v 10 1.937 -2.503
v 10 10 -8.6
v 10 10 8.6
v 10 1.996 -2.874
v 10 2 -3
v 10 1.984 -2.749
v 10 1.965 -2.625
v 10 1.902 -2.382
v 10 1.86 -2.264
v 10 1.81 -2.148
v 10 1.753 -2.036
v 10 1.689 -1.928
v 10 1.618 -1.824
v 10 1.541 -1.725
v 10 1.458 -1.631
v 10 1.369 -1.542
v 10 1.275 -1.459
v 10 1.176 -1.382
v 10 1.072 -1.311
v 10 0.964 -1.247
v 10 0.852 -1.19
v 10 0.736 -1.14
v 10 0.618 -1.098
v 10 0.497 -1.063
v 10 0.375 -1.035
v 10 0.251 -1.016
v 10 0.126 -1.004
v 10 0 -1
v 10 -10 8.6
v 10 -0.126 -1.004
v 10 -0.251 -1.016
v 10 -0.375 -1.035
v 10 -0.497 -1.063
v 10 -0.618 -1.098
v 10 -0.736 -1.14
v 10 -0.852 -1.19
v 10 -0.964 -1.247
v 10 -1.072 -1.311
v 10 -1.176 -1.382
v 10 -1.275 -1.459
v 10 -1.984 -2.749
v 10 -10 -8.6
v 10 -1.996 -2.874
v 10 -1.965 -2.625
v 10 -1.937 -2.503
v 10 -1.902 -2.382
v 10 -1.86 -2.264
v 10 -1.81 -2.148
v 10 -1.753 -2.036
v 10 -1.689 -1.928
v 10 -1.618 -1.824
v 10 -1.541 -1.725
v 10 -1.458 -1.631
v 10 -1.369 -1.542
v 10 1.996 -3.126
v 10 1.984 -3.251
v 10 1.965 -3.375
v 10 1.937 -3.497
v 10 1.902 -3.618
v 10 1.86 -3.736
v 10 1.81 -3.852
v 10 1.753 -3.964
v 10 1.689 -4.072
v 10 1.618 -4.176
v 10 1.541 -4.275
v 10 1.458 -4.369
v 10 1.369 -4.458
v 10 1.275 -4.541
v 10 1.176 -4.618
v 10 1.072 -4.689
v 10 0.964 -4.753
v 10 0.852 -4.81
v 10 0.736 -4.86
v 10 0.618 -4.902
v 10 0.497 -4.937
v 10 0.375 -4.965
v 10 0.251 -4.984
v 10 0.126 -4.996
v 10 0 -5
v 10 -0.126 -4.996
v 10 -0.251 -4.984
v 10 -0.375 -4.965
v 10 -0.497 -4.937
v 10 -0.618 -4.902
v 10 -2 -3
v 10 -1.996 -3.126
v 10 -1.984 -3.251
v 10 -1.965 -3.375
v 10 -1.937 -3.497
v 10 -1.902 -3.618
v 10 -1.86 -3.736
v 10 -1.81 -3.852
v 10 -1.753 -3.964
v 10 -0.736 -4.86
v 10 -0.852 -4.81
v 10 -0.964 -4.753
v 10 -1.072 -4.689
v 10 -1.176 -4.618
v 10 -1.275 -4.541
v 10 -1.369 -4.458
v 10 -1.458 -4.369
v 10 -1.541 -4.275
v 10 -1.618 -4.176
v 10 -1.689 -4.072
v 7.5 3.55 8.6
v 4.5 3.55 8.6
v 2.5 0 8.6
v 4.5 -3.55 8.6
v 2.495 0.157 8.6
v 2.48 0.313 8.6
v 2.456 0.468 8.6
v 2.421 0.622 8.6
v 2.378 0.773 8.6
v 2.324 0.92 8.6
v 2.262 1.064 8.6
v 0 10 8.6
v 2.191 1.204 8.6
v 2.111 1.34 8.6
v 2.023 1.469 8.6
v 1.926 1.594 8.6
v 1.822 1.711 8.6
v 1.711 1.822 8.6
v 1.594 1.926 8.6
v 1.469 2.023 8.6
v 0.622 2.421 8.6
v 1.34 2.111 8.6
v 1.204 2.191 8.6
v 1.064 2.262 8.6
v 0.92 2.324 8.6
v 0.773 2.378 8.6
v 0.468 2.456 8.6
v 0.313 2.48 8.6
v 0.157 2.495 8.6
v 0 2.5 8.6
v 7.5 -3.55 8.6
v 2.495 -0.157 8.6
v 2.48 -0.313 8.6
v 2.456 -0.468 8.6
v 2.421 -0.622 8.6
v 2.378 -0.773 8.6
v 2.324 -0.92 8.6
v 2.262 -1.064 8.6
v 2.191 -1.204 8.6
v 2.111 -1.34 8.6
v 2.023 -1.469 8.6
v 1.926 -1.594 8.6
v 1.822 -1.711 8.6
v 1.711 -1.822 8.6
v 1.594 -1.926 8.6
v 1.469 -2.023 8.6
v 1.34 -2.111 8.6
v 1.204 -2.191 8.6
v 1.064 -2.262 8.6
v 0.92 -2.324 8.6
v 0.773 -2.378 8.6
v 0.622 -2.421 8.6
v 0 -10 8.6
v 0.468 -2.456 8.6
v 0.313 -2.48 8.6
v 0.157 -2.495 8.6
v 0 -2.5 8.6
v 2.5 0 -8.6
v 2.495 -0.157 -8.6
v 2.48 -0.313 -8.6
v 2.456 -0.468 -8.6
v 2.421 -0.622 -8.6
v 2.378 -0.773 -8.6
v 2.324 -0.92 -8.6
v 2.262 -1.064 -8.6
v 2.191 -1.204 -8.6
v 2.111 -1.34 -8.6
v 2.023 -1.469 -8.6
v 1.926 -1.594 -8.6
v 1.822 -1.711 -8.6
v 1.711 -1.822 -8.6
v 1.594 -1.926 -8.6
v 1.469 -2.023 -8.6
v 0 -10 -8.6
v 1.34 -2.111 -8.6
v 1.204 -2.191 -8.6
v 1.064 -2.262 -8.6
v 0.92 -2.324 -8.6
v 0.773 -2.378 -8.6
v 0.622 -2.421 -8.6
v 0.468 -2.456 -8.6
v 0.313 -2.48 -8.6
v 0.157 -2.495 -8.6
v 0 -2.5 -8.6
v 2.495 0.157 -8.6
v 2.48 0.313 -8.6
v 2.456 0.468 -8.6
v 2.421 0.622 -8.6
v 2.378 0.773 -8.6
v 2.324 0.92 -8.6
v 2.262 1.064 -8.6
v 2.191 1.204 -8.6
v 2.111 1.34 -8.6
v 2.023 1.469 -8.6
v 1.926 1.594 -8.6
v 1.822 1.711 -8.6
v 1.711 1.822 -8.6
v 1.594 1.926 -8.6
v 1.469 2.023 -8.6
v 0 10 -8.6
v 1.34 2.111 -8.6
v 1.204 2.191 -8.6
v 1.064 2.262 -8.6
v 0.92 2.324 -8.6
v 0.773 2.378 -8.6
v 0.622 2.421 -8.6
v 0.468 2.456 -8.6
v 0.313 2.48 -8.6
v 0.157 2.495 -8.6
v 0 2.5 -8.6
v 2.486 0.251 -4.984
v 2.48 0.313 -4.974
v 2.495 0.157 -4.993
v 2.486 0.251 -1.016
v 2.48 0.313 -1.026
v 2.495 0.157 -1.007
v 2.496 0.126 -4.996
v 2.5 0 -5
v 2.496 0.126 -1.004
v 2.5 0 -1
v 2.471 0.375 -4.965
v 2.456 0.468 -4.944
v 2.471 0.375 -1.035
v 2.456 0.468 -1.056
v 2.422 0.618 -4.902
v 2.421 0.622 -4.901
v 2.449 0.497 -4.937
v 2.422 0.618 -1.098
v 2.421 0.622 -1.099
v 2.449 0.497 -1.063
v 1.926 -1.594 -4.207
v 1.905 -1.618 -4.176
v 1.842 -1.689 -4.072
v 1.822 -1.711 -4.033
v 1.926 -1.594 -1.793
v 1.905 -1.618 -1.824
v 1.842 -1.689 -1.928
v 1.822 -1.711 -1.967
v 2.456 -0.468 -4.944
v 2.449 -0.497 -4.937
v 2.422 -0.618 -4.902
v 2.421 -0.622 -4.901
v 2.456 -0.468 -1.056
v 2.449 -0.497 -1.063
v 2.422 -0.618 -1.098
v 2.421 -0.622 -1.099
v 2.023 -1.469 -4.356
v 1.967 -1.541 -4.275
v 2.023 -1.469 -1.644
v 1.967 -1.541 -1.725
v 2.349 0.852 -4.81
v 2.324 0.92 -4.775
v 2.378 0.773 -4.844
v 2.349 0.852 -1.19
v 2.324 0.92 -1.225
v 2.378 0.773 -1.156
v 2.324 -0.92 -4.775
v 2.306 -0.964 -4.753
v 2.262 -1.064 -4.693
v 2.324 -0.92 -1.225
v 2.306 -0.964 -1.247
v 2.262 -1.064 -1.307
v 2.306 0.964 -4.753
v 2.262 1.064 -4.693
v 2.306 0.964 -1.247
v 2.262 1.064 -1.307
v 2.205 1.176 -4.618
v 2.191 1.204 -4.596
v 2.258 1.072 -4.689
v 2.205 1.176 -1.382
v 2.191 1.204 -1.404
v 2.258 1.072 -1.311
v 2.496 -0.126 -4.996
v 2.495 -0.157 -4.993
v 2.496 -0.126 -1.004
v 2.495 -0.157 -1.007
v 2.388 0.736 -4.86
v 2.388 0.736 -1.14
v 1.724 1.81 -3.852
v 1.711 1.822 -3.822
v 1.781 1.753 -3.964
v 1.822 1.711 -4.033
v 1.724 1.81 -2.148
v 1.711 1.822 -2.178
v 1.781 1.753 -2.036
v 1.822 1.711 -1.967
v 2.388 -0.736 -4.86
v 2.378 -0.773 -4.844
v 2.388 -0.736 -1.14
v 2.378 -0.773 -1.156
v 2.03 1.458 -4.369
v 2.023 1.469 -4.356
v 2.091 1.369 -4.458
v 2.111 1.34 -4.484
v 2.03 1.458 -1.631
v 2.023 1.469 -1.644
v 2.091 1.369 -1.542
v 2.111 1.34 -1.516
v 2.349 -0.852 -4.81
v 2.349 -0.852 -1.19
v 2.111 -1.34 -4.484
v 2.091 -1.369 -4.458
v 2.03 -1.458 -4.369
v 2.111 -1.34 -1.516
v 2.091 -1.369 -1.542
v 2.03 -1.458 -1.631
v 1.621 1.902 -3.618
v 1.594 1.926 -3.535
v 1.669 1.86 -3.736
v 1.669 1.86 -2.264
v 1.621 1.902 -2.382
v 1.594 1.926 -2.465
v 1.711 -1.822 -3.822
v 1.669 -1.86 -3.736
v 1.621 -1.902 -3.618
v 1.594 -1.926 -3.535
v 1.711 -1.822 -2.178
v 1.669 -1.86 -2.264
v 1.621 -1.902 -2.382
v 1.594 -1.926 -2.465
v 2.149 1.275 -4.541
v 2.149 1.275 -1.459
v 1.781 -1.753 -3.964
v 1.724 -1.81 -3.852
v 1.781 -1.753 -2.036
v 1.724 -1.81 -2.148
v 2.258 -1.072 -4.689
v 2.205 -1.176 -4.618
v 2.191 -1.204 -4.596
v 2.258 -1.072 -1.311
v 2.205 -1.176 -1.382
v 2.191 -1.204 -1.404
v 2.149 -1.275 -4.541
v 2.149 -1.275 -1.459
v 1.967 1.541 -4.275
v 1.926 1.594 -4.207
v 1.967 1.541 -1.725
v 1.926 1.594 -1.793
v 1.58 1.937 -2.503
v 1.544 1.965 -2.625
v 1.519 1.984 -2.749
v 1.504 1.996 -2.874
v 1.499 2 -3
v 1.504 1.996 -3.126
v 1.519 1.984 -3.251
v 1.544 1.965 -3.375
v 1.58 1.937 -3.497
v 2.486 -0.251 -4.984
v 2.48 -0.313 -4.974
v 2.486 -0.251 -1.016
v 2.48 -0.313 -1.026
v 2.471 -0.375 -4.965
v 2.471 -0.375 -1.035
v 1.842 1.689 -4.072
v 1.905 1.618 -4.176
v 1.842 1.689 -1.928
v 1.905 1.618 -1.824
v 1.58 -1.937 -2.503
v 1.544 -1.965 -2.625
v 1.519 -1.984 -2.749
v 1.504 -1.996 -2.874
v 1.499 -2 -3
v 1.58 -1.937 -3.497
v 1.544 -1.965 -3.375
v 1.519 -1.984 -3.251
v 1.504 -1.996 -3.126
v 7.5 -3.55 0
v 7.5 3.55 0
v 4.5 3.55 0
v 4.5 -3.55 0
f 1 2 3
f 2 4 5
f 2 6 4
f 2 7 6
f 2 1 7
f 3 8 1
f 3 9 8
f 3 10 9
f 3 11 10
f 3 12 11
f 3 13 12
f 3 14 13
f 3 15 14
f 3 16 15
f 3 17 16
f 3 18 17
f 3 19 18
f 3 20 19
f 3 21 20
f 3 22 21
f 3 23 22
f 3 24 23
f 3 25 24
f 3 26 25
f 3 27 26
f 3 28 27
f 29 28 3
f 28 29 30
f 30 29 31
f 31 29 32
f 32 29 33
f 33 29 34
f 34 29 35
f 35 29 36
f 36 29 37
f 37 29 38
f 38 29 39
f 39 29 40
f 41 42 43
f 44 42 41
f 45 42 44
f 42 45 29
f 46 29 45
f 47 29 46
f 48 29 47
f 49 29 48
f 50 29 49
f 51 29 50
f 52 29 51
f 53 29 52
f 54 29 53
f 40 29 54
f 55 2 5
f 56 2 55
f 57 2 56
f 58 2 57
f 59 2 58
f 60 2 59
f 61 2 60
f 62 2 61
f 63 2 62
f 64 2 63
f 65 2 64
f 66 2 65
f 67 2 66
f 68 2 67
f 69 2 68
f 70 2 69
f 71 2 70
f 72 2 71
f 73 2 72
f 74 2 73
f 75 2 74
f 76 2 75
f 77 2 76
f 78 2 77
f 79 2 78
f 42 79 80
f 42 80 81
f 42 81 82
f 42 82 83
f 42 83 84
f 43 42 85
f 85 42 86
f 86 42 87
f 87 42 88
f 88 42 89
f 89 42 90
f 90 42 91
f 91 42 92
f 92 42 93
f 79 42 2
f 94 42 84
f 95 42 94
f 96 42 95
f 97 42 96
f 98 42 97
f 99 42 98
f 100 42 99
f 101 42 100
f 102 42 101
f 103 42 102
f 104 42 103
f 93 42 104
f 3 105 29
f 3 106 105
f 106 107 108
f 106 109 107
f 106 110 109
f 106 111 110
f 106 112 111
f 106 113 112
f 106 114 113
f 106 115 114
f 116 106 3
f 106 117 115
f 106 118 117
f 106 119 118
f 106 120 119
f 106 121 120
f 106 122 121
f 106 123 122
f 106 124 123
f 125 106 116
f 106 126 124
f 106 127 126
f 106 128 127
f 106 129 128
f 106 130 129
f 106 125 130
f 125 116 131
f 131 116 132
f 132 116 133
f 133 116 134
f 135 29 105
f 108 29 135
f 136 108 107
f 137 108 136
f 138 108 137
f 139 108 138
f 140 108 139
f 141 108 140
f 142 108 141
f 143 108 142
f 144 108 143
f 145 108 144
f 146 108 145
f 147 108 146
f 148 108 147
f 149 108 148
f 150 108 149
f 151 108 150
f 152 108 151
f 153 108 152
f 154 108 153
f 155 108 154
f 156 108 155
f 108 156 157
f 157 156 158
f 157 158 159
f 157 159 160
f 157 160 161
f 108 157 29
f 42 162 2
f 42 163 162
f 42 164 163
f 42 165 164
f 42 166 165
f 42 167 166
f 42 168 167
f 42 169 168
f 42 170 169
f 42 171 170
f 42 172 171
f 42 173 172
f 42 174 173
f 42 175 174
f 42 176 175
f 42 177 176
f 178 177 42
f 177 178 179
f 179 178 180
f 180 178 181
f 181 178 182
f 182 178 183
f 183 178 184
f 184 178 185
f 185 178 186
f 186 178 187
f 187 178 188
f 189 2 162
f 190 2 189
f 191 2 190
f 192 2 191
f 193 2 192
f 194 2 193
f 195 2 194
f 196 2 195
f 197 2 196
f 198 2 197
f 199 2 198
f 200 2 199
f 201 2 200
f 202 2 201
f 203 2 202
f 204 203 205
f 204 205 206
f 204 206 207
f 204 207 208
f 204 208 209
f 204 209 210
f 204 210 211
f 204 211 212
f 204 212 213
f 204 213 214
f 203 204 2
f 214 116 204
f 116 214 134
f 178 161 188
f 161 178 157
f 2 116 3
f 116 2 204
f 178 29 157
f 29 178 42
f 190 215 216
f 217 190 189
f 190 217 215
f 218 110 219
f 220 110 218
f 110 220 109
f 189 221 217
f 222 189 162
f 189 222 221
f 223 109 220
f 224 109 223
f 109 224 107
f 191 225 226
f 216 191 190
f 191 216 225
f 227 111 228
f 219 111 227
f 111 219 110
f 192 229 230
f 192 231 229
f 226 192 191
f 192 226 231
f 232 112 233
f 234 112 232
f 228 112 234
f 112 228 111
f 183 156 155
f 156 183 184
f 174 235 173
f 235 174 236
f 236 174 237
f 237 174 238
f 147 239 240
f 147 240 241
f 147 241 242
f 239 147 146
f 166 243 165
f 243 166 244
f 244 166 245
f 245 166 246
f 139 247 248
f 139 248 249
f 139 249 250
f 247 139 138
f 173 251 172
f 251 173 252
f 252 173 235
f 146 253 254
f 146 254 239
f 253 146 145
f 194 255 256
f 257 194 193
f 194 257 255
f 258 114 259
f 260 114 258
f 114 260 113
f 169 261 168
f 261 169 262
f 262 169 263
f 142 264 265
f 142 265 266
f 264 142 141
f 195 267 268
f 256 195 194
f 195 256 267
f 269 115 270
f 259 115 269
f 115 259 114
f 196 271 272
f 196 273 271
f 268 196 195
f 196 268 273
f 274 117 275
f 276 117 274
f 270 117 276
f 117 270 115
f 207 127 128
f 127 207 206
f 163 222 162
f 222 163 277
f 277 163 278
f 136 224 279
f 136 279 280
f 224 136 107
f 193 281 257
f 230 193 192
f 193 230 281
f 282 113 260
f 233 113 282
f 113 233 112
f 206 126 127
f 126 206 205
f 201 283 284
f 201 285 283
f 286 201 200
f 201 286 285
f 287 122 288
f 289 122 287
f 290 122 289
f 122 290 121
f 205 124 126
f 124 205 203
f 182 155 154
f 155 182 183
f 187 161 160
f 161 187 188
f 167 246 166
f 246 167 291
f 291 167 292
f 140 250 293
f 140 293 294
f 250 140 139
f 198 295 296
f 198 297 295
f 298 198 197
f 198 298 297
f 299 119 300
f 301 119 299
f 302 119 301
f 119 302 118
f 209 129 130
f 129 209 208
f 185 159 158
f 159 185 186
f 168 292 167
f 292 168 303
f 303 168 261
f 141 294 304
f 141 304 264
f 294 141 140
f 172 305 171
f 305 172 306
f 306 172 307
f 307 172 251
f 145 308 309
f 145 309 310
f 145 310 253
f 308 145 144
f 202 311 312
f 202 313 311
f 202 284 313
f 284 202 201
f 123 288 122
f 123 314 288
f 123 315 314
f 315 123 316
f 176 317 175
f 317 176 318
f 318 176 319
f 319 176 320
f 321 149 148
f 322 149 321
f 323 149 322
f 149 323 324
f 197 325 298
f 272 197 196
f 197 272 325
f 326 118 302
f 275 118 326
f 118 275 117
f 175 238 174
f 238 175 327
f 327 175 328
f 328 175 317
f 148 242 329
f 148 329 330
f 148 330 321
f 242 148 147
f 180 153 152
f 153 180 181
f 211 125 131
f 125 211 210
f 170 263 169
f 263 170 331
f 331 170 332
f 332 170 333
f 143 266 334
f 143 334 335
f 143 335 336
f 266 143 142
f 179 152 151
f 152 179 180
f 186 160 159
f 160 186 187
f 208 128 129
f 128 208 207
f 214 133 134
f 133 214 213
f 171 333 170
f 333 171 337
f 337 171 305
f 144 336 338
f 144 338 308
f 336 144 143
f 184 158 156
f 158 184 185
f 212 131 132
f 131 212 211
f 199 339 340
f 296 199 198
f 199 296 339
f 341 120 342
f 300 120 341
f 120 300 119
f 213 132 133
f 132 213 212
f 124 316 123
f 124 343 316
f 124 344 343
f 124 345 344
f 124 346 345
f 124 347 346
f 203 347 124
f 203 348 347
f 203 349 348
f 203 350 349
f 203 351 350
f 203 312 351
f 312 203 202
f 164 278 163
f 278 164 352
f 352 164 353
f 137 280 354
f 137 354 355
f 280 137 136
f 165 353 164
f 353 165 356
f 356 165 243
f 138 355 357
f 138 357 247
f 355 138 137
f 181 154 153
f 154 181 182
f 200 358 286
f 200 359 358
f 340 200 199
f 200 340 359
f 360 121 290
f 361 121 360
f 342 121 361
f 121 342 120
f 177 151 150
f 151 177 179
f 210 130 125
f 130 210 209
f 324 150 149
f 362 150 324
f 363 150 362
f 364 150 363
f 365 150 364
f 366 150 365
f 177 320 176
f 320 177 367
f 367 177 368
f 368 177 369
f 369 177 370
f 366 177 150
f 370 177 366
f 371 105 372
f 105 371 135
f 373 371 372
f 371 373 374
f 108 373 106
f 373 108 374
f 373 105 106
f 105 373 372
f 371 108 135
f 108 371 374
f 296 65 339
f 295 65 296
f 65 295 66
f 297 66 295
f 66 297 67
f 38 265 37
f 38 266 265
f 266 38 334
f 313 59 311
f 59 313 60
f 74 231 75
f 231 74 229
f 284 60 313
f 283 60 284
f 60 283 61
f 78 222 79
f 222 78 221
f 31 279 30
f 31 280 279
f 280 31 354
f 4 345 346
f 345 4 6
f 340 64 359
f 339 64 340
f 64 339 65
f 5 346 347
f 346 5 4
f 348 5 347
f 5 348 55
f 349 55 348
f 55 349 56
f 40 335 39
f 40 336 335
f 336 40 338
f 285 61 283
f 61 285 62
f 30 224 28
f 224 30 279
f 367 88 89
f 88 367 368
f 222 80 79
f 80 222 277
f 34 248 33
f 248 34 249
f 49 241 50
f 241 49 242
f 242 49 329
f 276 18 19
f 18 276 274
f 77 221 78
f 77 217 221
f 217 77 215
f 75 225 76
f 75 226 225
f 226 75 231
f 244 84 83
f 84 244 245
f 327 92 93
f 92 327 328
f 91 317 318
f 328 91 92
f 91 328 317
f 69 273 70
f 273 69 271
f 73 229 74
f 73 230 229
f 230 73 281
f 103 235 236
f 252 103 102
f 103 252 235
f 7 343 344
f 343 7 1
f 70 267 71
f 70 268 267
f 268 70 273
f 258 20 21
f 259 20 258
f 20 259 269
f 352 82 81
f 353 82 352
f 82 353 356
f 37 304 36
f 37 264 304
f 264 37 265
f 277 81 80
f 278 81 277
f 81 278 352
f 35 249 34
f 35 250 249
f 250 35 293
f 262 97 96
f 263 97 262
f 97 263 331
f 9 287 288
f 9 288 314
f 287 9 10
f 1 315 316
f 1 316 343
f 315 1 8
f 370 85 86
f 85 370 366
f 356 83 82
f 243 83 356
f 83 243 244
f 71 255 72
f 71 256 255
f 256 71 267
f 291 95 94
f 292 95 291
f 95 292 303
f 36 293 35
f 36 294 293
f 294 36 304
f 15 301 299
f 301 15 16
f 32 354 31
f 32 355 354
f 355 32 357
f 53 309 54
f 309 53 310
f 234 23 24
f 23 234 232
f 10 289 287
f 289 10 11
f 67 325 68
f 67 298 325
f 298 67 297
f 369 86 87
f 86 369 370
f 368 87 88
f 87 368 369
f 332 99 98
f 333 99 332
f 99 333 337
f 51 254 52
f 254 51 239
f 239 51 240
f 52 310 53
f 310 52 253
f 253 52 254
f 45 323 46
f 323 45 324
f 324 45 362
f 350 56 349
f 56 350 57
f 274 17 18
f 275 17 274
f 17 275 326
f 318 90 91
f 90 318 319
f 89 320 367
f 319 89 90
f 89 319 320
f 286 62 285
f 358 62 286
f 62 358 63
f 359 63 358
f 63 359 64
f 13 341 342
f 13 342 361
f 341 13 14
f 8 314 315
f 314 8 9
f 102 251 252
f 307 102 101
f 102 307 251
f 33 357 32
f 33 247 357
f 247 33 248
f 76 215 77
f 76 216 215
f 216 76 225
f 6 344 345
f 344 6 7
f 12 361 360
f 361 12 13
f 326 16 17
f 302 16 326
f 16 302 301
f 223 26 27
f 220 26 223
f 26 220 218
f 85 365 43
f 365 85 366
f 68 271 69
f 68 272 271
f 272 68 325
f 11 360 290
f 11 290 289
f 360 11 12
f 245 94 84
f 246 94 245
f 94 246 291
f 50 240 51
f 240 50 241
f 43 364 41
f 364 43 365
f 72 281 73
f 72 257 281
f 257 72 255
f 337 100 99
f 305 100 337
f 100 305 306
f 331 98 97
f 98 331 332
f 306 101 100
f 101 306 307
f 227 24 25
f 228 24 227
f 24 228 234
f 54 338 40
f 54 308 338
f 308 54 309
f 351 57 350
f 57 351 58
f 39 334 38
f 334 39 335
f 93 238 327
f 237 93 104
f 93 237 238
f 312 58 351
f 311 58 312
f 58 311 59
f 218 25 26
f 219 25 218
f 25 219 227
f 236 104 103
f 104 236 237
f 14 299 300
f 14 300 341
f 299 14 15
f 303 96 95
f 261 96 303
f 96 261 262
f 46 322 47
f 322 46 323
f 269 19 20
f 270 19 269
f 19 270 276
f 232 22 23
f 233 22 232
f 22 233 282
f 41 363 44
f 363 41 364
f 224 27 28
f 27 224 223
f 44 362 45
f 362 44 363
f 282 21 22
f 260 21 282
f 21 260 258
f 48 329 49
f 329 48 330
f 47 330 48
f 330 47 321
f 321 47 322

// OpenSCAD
fn = 100;

module pump_arm_bottom(thickness, innner_d, outer_d, arm_radius, arm_mount_radius){
  difference(){
    pump_arm(thickness, innner_d, outer_d, arm_radius, arm_mount_radius);
    union(){
      translate(v=[0,0,3.6+thickness]) cube(size = [arm_mount_radius*4, arm_radius*4, thickness*2], center=true);
      translate(v=[0, arm_radius,2]) cylinder(r = 11.5, h = 7.1, center=true, $fn = fn);
      translate(v=[0,-arm_radius,2]) cylinder(r = 11.5, h = 7.1, center=true, $fn = fn);
    }
  }
}

module pump_arm_top(thickness, innner_d, outer_d, arm_radius, arm_mount_radius){
  difference(){
    pump_arm(thickness, innner_d, outer_d, arm_radius, arm_mount_radius);
    translate(v=[0,0,3.6-thickness*2]) cube(size = [arm_mount_radius*4, arm_radius*4, thickness*4], center=true);
  }
}


module pump_arm(thickness, innner_d, outer_d, arm_radius, arm_mount_radius){
  radius = arm_mount_radius;
  
  difference(){
    union(){
      
      // upper arm
      translate(v=[0, arm_radius,3.6+thickness/2]) cylinder(r = radius, h = thickness, center=true, $fn = fn);
      translate(v=[0,-arm_radius,3.6+thickness/2]) cylinder(r = radius, h = thickness, center=true, $fn = fn);
      translate(v=[0,0,3.6+thickness/2]) cube(size = [radius*2, arm_radius*2, thickness], center=true);

      // lower arm
      translate(v=[0,arm_radius,-(3.6+thickness/2)]) cylinder(r = radius, h = thickness, center=true, $fn = fn);
      translate(v=[0,-arm_radius,-(3.6+thickness/2)]) cylinder(r = radius, h = thickness, center=true, $fn = fn);
      translate(v=[0,0,-(3.6+thickness/2)]) cube(size = [radius*2, arm_radius*2, thickness], center=true);
     
     // body
     translate(v=[0,0,0]) cube(size = [radius*2, arm_radius*2, 7.2+thickness*2], center=true);
     translate(v=[5,0,0]) cube(size = [10, 20, 7.2+thickness*2], center=true);

    }
    union(){

      // bolt holes
      translate(v=[0, arm_radius,0]) cylinder(r = 4.1, h = 20, center=true, $fn = fn);
      translate(v=[0,-arm_radius,0]) cylinder(r = 4.1, h = 20, center=true, $fn = fn);

      // bearing holes
      translate(v=[0, arm_radius,0]) cylinder(r = 11.5, h = 7.1, center=true, $fn = fn);
      translate(v=[0,-arm_radius,0]) cylinder(r = 11.5, h = 7.1, center=true, $fn = fn);

      // 5mm stepper axle hole
      translate(v=[0,0,0]) cylinder(r = 5/2, h = thickness*4+11, center=true, $fn = fn);
      translate(v=[6,0, 5])  cube(size = [3, 7.1, 10], center=true);  // m4 nut slot
      rotate([0,90,0]) translate(v=[3, 0, 10])  cylinder(r = 2, h = 20, center=true, $fn = fn);
    }
  }


}

tubing_r = 30; 
pump_arm(5, 7, 9 , tubing_r);

//translate(v=[0,tubing_r-9,0]) m8_bearing();
//translate(v=[0,-tubing_r+9,0]) m8_bearing();
//color([0.1,1,0.1]) translate(v=[0,0,0]) cube(size = [100,100,0.01], center=true);
